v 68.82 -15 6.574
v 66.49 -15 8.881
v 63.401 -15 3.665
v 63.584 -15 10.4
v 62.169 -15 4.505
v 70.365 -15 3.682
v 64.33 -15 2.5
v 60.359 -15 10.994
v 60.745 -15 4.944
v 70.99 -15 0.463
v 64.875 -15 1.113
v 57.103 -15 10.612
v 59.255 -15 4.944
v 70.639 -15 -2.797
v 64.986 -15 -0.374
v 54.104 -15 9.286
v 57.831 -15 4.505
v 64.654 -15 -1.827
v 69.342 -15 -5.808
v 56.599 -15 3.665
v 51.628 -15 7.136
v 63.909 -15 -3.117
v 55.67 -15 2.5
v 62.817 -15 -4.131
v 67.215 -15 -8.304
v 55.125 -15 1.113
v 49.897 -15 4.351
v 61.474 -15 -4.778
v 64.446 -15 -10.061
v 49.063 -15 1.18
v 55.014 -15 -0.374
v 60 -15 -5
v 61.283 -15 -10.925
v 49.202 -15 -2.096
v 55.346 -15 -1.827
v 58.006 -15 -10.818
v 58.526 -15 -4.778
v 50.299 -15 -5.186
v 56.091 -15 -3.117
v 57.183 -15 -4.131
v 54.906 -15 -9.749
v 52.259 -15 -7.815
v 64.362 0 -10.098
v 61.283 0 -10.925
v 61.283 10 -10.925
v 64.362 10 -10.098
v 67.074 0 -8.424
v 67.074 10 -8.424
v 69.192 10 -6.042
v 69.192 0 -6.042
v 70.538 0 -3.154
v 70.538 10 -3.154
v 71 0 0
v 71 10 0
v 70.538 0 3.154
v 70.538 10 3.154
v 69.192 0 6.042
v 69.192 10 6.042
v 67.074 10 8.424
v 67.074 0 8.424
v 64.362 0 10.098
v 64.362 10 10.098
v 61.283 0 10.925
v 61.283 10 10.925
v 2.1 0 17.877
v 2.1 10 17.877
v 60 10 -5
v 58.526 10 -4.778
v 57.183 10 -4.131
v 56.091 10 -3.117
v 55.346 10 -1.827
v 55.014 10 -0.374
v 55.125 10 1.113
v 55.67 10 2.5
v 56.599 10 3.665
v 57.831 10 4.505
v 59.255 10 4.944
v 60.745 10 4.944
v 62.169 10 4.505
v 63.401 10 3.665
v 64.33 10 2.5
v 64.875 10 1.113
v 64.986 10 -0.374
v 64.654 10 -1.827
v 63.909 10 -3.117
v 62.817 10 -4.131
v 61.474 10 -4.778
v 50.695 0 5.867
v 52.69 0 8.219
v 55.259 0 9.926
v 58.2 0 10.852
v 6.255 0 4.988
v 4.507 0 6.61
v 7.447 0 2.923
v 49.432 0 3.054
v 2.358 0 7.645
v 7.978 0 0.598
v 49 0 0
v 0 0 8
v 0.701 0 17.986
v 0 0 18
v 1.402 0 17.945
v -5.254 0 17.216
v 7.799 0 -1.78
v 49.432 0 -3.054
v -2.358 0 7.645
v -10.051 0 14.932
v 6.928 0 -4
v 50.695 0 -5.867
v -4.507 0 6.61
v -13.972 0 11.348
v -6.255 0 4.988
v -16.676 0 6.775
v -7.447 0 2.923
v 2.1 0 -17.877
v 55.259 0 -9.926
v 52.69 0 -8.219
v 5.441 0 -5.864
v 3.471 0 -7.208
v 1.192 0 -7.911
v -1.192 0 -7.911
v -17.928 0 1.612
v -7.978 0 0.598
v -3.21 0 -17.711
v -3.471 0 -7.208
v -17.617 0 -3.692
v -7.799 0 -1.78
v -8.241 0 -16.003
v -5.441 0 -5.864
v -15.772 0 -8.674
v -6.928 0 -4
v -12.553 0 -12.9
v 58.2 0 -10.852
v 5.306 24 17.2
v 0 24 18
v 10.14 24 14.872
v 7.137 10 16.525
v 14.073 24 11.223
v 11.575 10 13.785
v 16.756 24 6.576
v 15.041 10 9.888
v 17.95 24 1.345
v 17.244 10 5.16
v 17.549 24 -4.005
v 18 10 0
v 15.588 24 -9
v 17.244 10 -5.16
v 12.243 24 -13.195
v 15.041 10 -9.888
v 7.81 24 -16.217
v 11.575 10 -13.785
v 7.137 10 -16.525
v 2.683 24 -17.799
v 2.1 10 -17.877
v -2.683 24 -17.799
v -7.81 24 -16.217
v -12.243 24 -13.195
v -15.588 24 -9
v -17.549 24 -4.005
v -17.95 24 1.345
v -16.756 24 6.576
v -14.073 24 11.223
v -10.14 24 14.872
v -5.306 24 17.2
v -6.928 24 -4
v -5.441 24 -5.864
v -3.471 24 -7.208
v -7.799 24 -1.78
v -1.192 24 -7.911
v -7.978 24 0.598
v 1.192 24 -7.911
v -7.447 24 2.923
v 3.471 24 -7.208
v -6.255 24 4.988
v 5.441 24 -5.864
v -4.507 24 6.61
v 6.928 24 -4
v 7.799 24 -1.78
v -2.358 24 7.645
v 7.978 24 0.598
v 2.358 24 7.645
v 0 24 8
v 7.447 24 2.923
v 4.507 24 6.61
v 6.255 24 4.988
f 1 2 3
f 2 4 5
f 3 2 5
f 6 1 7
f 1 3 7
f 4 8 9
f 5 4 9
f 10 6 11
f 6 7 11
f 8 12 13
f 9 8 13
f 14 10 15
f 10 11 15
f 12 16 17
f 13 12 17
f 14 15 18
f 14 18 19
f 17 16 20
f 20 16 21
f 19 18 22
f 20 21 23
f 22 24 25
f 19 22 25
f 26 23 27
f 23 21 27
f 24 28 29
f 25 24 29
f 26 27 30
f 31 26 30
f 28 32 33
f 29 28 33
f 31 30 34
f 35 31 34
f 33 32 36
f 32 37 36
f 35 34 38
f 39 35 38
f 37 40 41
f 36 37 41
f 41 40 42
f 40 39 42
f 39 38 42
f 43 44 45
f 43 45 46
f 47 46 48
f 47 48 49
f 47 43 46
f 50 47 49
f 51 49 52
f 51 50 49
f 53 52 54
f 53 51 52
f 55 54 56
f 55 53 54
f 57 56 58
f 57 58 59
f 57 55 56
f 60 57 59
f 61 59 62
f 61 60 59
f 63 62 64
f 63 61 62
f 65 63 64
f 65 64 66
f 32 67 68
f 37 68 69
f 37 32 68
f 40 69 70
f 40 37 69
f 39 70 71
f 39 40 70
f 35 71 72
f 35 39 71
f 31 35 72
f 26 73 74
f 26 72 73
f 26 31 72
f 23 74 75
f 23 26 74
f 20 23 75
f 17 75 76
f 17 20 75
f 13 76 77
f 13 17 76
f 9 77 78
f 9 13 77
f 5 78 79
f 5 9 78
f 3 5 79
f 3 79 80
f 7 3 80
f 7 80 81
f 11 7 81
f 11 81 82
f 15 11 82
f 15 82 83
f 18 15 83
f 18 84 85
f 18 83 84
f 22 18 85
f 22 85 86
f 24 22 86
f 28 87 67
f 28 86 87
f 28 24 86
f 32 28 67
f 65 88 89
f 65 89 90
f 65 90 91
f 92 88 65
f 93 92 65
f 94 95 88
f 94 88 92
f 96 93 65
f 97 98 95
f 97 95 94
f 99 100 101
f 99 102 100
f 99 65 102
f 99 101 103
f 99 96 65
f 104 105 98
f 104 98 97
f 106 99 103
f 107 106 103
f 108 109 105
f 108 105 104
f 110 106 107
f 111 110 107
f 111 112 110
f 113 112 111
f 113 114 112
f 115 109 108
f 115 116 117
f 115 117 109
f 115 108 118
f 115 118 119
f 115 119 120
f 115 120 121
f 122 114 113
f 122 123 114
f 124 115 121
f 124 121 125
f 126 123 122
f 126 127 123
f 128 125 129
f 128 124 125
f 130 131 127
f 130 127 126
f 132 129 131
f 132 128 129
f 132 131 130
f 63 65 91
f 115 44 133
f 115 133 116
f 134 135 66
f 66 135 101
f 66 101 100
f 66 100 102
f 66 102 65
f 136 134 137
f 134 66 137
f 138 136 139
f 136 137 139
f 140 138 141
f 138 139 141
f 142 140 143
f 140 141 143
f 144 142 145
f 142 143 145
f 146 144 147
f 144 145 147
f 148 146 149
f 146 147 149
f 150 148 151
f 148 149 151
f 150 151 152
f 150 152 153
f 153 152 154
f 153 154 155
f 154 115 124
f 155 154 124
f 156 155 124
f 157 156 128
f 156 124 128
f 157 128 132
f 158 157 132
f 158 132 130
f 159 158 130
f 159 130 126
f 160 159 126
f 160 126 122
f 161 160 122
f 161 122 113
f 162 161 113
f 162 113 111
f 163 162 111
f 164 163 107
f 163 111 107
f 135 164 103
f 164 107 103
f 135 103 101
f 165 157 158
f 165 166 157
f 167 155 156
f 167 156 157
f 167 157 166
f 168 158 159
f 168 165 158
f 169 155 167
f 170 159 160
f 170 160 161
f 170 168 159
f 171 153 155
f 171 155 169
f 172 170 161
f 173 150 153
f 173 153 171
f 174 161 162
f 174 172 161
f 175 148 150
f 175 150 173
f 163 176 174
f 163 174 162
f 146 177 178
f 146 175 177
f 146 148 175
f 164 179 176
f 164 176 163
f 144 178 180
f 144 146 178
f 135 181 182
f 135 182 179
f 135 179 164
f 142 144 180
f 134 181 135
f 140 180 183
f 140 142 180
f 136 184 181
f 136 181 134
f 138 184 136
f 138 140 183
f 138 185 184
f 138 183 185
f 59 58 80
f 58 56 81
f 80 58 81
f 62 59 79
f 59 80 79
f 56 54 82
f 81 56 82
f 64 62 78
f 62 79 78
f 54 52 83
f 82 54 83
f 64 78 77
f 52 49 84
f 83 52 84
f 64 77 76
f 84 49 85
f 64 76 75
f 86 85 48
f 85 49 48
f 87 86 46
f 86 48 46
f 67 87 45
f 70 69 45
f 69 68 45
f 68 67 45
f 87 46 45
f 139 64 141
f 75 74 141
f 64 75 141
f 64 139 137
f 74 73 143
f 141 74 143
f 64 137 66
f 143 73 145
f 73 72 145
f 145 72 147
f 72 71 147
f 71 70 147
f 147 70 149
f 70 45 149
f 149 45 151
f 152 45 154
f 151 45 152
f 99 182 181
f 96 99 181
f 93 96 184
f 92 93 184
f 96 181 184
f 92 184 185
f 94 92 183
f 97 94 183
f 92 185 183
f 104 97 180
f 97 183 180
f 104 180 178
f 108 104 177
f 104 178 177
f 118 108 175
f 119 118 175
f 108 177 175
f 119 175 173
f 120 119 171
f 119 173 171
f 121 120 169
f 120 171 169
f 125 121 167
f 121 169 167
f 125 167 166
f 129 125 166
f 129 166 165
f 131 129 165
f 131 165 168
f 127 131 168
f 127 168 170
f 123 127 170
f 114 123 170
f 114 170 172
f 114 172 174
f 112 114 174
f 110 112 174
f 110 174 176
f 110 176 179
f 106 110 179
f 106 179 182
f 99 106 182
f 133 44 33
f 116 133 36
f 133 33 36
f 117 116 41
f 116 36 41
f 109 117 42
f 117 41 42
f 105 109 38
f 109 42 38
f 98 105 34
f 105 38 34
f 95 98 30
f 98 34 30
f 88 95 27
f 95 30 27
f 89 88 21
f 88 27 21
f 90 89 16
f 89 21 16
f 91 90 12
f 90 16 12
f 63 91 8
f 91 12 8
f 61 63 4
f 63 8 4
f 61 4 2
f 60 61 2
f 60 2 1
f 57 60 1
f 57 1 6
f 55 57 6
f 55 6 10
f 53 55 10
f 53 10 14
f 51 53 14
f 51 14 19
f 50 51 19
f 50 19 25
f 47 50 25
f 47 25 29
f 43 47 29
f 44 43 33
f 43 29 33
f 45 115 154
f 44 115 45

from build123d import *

# Parameters (mm, degrees)
SKETCH_1_R          = 18
EXTRUDE_1_DEPTH     = 24
EXTRUDE_2_DEPTH     = 10
EXTRUDE_START       = -15
SKETCH_3_R          = 11
EXTRUDE_3_DEPTH     = 15
SKETCH_4_R          = 8
CUT_EXTRUDE_1_DEPTH = 83.981925743
SKETCH_5_R          = 5
CUT_EXTRUDE_2_DEPTH = 83.981925743


with BuildPart() as part:
    # 草图1 → 凸台-拉伸1 (new body)
    with BuildSketch(Plane(origin=(0, 0, 0), x_dir=(1, 0, 0), z_dir=(0, 1, 0))):
        with Locations(Location((0, 0, 0), (0, 0, 270))):
            Circle(SKETCH_1_R)
    extrude(amount=EXTRUDE_1_DEPTH)

    # 草图2 → 凸台-拉伸2 (add)
    with BuildSketch(Plane(origin=(0, 0, 0), x_dir=(1, 0, 0), z_dir=(0, 1, 0))):
        with BuildLine():
            Line((2.1, 17.877080299), (61.283333333, 10.924882405))
            ThreePointArc((61.283333333, 10.924882405), (71, 0), (61.283333333, -10.924882405))
            Line((61.283333333, -10.924882405), (2.1, -17.877080299))
            ThreePointArc((2.1, -17.877080299), (-18, 0), (2.1, 17.877080299))
        make_face()
    extrude(amount=EXTRUDE_2_DEPTH)

    # 草图3 → 凸台-拉伸3 (add)
    with BuildSketch(Plane(origin=(0, 0, 0), x_dir=(1, 0, 0), z_dir=(0, 1, 0)).offset(EXTRUDE_START)):
        with Locations(Location((60, 0, 0), (0, 0, 83.300234822))):
            Circle(SKETCH_3_R)
    extrude(amount=EXTRUDE_3_DEPTH)

    # 草图4 → 切除-拉伸1 (cut, through all)
    with BuildSketch(Plane(origin=(0, 24, 0), x_dir=(1, 0, 0), z_dir=(0, 1, 0))):
        with Locations(Location((0, 0, 0), (0, 0, 270))):
            Circle(SKETCH_4_R)
    extrude(amount=-CUT_EXTRUDE_1_DEPTH, mode=Mode.SUBTRACT)

    # 草图5 → 切除-拉伸2 (cut, through all)
    with BuildSketch(Plane(origin=(0, -15, 0), x_dir=(1, 0, 0), z_dir=(0, 1, 0))):
        with Locations(Location((60, 0, 0), (0, 0, 90))):
            Circle(SKETCH_5_R)
    extrude(amount=CUT_EXTRUDE_2_DEPTH, mode=Mode.SUBTRACT)


solid = part.part
